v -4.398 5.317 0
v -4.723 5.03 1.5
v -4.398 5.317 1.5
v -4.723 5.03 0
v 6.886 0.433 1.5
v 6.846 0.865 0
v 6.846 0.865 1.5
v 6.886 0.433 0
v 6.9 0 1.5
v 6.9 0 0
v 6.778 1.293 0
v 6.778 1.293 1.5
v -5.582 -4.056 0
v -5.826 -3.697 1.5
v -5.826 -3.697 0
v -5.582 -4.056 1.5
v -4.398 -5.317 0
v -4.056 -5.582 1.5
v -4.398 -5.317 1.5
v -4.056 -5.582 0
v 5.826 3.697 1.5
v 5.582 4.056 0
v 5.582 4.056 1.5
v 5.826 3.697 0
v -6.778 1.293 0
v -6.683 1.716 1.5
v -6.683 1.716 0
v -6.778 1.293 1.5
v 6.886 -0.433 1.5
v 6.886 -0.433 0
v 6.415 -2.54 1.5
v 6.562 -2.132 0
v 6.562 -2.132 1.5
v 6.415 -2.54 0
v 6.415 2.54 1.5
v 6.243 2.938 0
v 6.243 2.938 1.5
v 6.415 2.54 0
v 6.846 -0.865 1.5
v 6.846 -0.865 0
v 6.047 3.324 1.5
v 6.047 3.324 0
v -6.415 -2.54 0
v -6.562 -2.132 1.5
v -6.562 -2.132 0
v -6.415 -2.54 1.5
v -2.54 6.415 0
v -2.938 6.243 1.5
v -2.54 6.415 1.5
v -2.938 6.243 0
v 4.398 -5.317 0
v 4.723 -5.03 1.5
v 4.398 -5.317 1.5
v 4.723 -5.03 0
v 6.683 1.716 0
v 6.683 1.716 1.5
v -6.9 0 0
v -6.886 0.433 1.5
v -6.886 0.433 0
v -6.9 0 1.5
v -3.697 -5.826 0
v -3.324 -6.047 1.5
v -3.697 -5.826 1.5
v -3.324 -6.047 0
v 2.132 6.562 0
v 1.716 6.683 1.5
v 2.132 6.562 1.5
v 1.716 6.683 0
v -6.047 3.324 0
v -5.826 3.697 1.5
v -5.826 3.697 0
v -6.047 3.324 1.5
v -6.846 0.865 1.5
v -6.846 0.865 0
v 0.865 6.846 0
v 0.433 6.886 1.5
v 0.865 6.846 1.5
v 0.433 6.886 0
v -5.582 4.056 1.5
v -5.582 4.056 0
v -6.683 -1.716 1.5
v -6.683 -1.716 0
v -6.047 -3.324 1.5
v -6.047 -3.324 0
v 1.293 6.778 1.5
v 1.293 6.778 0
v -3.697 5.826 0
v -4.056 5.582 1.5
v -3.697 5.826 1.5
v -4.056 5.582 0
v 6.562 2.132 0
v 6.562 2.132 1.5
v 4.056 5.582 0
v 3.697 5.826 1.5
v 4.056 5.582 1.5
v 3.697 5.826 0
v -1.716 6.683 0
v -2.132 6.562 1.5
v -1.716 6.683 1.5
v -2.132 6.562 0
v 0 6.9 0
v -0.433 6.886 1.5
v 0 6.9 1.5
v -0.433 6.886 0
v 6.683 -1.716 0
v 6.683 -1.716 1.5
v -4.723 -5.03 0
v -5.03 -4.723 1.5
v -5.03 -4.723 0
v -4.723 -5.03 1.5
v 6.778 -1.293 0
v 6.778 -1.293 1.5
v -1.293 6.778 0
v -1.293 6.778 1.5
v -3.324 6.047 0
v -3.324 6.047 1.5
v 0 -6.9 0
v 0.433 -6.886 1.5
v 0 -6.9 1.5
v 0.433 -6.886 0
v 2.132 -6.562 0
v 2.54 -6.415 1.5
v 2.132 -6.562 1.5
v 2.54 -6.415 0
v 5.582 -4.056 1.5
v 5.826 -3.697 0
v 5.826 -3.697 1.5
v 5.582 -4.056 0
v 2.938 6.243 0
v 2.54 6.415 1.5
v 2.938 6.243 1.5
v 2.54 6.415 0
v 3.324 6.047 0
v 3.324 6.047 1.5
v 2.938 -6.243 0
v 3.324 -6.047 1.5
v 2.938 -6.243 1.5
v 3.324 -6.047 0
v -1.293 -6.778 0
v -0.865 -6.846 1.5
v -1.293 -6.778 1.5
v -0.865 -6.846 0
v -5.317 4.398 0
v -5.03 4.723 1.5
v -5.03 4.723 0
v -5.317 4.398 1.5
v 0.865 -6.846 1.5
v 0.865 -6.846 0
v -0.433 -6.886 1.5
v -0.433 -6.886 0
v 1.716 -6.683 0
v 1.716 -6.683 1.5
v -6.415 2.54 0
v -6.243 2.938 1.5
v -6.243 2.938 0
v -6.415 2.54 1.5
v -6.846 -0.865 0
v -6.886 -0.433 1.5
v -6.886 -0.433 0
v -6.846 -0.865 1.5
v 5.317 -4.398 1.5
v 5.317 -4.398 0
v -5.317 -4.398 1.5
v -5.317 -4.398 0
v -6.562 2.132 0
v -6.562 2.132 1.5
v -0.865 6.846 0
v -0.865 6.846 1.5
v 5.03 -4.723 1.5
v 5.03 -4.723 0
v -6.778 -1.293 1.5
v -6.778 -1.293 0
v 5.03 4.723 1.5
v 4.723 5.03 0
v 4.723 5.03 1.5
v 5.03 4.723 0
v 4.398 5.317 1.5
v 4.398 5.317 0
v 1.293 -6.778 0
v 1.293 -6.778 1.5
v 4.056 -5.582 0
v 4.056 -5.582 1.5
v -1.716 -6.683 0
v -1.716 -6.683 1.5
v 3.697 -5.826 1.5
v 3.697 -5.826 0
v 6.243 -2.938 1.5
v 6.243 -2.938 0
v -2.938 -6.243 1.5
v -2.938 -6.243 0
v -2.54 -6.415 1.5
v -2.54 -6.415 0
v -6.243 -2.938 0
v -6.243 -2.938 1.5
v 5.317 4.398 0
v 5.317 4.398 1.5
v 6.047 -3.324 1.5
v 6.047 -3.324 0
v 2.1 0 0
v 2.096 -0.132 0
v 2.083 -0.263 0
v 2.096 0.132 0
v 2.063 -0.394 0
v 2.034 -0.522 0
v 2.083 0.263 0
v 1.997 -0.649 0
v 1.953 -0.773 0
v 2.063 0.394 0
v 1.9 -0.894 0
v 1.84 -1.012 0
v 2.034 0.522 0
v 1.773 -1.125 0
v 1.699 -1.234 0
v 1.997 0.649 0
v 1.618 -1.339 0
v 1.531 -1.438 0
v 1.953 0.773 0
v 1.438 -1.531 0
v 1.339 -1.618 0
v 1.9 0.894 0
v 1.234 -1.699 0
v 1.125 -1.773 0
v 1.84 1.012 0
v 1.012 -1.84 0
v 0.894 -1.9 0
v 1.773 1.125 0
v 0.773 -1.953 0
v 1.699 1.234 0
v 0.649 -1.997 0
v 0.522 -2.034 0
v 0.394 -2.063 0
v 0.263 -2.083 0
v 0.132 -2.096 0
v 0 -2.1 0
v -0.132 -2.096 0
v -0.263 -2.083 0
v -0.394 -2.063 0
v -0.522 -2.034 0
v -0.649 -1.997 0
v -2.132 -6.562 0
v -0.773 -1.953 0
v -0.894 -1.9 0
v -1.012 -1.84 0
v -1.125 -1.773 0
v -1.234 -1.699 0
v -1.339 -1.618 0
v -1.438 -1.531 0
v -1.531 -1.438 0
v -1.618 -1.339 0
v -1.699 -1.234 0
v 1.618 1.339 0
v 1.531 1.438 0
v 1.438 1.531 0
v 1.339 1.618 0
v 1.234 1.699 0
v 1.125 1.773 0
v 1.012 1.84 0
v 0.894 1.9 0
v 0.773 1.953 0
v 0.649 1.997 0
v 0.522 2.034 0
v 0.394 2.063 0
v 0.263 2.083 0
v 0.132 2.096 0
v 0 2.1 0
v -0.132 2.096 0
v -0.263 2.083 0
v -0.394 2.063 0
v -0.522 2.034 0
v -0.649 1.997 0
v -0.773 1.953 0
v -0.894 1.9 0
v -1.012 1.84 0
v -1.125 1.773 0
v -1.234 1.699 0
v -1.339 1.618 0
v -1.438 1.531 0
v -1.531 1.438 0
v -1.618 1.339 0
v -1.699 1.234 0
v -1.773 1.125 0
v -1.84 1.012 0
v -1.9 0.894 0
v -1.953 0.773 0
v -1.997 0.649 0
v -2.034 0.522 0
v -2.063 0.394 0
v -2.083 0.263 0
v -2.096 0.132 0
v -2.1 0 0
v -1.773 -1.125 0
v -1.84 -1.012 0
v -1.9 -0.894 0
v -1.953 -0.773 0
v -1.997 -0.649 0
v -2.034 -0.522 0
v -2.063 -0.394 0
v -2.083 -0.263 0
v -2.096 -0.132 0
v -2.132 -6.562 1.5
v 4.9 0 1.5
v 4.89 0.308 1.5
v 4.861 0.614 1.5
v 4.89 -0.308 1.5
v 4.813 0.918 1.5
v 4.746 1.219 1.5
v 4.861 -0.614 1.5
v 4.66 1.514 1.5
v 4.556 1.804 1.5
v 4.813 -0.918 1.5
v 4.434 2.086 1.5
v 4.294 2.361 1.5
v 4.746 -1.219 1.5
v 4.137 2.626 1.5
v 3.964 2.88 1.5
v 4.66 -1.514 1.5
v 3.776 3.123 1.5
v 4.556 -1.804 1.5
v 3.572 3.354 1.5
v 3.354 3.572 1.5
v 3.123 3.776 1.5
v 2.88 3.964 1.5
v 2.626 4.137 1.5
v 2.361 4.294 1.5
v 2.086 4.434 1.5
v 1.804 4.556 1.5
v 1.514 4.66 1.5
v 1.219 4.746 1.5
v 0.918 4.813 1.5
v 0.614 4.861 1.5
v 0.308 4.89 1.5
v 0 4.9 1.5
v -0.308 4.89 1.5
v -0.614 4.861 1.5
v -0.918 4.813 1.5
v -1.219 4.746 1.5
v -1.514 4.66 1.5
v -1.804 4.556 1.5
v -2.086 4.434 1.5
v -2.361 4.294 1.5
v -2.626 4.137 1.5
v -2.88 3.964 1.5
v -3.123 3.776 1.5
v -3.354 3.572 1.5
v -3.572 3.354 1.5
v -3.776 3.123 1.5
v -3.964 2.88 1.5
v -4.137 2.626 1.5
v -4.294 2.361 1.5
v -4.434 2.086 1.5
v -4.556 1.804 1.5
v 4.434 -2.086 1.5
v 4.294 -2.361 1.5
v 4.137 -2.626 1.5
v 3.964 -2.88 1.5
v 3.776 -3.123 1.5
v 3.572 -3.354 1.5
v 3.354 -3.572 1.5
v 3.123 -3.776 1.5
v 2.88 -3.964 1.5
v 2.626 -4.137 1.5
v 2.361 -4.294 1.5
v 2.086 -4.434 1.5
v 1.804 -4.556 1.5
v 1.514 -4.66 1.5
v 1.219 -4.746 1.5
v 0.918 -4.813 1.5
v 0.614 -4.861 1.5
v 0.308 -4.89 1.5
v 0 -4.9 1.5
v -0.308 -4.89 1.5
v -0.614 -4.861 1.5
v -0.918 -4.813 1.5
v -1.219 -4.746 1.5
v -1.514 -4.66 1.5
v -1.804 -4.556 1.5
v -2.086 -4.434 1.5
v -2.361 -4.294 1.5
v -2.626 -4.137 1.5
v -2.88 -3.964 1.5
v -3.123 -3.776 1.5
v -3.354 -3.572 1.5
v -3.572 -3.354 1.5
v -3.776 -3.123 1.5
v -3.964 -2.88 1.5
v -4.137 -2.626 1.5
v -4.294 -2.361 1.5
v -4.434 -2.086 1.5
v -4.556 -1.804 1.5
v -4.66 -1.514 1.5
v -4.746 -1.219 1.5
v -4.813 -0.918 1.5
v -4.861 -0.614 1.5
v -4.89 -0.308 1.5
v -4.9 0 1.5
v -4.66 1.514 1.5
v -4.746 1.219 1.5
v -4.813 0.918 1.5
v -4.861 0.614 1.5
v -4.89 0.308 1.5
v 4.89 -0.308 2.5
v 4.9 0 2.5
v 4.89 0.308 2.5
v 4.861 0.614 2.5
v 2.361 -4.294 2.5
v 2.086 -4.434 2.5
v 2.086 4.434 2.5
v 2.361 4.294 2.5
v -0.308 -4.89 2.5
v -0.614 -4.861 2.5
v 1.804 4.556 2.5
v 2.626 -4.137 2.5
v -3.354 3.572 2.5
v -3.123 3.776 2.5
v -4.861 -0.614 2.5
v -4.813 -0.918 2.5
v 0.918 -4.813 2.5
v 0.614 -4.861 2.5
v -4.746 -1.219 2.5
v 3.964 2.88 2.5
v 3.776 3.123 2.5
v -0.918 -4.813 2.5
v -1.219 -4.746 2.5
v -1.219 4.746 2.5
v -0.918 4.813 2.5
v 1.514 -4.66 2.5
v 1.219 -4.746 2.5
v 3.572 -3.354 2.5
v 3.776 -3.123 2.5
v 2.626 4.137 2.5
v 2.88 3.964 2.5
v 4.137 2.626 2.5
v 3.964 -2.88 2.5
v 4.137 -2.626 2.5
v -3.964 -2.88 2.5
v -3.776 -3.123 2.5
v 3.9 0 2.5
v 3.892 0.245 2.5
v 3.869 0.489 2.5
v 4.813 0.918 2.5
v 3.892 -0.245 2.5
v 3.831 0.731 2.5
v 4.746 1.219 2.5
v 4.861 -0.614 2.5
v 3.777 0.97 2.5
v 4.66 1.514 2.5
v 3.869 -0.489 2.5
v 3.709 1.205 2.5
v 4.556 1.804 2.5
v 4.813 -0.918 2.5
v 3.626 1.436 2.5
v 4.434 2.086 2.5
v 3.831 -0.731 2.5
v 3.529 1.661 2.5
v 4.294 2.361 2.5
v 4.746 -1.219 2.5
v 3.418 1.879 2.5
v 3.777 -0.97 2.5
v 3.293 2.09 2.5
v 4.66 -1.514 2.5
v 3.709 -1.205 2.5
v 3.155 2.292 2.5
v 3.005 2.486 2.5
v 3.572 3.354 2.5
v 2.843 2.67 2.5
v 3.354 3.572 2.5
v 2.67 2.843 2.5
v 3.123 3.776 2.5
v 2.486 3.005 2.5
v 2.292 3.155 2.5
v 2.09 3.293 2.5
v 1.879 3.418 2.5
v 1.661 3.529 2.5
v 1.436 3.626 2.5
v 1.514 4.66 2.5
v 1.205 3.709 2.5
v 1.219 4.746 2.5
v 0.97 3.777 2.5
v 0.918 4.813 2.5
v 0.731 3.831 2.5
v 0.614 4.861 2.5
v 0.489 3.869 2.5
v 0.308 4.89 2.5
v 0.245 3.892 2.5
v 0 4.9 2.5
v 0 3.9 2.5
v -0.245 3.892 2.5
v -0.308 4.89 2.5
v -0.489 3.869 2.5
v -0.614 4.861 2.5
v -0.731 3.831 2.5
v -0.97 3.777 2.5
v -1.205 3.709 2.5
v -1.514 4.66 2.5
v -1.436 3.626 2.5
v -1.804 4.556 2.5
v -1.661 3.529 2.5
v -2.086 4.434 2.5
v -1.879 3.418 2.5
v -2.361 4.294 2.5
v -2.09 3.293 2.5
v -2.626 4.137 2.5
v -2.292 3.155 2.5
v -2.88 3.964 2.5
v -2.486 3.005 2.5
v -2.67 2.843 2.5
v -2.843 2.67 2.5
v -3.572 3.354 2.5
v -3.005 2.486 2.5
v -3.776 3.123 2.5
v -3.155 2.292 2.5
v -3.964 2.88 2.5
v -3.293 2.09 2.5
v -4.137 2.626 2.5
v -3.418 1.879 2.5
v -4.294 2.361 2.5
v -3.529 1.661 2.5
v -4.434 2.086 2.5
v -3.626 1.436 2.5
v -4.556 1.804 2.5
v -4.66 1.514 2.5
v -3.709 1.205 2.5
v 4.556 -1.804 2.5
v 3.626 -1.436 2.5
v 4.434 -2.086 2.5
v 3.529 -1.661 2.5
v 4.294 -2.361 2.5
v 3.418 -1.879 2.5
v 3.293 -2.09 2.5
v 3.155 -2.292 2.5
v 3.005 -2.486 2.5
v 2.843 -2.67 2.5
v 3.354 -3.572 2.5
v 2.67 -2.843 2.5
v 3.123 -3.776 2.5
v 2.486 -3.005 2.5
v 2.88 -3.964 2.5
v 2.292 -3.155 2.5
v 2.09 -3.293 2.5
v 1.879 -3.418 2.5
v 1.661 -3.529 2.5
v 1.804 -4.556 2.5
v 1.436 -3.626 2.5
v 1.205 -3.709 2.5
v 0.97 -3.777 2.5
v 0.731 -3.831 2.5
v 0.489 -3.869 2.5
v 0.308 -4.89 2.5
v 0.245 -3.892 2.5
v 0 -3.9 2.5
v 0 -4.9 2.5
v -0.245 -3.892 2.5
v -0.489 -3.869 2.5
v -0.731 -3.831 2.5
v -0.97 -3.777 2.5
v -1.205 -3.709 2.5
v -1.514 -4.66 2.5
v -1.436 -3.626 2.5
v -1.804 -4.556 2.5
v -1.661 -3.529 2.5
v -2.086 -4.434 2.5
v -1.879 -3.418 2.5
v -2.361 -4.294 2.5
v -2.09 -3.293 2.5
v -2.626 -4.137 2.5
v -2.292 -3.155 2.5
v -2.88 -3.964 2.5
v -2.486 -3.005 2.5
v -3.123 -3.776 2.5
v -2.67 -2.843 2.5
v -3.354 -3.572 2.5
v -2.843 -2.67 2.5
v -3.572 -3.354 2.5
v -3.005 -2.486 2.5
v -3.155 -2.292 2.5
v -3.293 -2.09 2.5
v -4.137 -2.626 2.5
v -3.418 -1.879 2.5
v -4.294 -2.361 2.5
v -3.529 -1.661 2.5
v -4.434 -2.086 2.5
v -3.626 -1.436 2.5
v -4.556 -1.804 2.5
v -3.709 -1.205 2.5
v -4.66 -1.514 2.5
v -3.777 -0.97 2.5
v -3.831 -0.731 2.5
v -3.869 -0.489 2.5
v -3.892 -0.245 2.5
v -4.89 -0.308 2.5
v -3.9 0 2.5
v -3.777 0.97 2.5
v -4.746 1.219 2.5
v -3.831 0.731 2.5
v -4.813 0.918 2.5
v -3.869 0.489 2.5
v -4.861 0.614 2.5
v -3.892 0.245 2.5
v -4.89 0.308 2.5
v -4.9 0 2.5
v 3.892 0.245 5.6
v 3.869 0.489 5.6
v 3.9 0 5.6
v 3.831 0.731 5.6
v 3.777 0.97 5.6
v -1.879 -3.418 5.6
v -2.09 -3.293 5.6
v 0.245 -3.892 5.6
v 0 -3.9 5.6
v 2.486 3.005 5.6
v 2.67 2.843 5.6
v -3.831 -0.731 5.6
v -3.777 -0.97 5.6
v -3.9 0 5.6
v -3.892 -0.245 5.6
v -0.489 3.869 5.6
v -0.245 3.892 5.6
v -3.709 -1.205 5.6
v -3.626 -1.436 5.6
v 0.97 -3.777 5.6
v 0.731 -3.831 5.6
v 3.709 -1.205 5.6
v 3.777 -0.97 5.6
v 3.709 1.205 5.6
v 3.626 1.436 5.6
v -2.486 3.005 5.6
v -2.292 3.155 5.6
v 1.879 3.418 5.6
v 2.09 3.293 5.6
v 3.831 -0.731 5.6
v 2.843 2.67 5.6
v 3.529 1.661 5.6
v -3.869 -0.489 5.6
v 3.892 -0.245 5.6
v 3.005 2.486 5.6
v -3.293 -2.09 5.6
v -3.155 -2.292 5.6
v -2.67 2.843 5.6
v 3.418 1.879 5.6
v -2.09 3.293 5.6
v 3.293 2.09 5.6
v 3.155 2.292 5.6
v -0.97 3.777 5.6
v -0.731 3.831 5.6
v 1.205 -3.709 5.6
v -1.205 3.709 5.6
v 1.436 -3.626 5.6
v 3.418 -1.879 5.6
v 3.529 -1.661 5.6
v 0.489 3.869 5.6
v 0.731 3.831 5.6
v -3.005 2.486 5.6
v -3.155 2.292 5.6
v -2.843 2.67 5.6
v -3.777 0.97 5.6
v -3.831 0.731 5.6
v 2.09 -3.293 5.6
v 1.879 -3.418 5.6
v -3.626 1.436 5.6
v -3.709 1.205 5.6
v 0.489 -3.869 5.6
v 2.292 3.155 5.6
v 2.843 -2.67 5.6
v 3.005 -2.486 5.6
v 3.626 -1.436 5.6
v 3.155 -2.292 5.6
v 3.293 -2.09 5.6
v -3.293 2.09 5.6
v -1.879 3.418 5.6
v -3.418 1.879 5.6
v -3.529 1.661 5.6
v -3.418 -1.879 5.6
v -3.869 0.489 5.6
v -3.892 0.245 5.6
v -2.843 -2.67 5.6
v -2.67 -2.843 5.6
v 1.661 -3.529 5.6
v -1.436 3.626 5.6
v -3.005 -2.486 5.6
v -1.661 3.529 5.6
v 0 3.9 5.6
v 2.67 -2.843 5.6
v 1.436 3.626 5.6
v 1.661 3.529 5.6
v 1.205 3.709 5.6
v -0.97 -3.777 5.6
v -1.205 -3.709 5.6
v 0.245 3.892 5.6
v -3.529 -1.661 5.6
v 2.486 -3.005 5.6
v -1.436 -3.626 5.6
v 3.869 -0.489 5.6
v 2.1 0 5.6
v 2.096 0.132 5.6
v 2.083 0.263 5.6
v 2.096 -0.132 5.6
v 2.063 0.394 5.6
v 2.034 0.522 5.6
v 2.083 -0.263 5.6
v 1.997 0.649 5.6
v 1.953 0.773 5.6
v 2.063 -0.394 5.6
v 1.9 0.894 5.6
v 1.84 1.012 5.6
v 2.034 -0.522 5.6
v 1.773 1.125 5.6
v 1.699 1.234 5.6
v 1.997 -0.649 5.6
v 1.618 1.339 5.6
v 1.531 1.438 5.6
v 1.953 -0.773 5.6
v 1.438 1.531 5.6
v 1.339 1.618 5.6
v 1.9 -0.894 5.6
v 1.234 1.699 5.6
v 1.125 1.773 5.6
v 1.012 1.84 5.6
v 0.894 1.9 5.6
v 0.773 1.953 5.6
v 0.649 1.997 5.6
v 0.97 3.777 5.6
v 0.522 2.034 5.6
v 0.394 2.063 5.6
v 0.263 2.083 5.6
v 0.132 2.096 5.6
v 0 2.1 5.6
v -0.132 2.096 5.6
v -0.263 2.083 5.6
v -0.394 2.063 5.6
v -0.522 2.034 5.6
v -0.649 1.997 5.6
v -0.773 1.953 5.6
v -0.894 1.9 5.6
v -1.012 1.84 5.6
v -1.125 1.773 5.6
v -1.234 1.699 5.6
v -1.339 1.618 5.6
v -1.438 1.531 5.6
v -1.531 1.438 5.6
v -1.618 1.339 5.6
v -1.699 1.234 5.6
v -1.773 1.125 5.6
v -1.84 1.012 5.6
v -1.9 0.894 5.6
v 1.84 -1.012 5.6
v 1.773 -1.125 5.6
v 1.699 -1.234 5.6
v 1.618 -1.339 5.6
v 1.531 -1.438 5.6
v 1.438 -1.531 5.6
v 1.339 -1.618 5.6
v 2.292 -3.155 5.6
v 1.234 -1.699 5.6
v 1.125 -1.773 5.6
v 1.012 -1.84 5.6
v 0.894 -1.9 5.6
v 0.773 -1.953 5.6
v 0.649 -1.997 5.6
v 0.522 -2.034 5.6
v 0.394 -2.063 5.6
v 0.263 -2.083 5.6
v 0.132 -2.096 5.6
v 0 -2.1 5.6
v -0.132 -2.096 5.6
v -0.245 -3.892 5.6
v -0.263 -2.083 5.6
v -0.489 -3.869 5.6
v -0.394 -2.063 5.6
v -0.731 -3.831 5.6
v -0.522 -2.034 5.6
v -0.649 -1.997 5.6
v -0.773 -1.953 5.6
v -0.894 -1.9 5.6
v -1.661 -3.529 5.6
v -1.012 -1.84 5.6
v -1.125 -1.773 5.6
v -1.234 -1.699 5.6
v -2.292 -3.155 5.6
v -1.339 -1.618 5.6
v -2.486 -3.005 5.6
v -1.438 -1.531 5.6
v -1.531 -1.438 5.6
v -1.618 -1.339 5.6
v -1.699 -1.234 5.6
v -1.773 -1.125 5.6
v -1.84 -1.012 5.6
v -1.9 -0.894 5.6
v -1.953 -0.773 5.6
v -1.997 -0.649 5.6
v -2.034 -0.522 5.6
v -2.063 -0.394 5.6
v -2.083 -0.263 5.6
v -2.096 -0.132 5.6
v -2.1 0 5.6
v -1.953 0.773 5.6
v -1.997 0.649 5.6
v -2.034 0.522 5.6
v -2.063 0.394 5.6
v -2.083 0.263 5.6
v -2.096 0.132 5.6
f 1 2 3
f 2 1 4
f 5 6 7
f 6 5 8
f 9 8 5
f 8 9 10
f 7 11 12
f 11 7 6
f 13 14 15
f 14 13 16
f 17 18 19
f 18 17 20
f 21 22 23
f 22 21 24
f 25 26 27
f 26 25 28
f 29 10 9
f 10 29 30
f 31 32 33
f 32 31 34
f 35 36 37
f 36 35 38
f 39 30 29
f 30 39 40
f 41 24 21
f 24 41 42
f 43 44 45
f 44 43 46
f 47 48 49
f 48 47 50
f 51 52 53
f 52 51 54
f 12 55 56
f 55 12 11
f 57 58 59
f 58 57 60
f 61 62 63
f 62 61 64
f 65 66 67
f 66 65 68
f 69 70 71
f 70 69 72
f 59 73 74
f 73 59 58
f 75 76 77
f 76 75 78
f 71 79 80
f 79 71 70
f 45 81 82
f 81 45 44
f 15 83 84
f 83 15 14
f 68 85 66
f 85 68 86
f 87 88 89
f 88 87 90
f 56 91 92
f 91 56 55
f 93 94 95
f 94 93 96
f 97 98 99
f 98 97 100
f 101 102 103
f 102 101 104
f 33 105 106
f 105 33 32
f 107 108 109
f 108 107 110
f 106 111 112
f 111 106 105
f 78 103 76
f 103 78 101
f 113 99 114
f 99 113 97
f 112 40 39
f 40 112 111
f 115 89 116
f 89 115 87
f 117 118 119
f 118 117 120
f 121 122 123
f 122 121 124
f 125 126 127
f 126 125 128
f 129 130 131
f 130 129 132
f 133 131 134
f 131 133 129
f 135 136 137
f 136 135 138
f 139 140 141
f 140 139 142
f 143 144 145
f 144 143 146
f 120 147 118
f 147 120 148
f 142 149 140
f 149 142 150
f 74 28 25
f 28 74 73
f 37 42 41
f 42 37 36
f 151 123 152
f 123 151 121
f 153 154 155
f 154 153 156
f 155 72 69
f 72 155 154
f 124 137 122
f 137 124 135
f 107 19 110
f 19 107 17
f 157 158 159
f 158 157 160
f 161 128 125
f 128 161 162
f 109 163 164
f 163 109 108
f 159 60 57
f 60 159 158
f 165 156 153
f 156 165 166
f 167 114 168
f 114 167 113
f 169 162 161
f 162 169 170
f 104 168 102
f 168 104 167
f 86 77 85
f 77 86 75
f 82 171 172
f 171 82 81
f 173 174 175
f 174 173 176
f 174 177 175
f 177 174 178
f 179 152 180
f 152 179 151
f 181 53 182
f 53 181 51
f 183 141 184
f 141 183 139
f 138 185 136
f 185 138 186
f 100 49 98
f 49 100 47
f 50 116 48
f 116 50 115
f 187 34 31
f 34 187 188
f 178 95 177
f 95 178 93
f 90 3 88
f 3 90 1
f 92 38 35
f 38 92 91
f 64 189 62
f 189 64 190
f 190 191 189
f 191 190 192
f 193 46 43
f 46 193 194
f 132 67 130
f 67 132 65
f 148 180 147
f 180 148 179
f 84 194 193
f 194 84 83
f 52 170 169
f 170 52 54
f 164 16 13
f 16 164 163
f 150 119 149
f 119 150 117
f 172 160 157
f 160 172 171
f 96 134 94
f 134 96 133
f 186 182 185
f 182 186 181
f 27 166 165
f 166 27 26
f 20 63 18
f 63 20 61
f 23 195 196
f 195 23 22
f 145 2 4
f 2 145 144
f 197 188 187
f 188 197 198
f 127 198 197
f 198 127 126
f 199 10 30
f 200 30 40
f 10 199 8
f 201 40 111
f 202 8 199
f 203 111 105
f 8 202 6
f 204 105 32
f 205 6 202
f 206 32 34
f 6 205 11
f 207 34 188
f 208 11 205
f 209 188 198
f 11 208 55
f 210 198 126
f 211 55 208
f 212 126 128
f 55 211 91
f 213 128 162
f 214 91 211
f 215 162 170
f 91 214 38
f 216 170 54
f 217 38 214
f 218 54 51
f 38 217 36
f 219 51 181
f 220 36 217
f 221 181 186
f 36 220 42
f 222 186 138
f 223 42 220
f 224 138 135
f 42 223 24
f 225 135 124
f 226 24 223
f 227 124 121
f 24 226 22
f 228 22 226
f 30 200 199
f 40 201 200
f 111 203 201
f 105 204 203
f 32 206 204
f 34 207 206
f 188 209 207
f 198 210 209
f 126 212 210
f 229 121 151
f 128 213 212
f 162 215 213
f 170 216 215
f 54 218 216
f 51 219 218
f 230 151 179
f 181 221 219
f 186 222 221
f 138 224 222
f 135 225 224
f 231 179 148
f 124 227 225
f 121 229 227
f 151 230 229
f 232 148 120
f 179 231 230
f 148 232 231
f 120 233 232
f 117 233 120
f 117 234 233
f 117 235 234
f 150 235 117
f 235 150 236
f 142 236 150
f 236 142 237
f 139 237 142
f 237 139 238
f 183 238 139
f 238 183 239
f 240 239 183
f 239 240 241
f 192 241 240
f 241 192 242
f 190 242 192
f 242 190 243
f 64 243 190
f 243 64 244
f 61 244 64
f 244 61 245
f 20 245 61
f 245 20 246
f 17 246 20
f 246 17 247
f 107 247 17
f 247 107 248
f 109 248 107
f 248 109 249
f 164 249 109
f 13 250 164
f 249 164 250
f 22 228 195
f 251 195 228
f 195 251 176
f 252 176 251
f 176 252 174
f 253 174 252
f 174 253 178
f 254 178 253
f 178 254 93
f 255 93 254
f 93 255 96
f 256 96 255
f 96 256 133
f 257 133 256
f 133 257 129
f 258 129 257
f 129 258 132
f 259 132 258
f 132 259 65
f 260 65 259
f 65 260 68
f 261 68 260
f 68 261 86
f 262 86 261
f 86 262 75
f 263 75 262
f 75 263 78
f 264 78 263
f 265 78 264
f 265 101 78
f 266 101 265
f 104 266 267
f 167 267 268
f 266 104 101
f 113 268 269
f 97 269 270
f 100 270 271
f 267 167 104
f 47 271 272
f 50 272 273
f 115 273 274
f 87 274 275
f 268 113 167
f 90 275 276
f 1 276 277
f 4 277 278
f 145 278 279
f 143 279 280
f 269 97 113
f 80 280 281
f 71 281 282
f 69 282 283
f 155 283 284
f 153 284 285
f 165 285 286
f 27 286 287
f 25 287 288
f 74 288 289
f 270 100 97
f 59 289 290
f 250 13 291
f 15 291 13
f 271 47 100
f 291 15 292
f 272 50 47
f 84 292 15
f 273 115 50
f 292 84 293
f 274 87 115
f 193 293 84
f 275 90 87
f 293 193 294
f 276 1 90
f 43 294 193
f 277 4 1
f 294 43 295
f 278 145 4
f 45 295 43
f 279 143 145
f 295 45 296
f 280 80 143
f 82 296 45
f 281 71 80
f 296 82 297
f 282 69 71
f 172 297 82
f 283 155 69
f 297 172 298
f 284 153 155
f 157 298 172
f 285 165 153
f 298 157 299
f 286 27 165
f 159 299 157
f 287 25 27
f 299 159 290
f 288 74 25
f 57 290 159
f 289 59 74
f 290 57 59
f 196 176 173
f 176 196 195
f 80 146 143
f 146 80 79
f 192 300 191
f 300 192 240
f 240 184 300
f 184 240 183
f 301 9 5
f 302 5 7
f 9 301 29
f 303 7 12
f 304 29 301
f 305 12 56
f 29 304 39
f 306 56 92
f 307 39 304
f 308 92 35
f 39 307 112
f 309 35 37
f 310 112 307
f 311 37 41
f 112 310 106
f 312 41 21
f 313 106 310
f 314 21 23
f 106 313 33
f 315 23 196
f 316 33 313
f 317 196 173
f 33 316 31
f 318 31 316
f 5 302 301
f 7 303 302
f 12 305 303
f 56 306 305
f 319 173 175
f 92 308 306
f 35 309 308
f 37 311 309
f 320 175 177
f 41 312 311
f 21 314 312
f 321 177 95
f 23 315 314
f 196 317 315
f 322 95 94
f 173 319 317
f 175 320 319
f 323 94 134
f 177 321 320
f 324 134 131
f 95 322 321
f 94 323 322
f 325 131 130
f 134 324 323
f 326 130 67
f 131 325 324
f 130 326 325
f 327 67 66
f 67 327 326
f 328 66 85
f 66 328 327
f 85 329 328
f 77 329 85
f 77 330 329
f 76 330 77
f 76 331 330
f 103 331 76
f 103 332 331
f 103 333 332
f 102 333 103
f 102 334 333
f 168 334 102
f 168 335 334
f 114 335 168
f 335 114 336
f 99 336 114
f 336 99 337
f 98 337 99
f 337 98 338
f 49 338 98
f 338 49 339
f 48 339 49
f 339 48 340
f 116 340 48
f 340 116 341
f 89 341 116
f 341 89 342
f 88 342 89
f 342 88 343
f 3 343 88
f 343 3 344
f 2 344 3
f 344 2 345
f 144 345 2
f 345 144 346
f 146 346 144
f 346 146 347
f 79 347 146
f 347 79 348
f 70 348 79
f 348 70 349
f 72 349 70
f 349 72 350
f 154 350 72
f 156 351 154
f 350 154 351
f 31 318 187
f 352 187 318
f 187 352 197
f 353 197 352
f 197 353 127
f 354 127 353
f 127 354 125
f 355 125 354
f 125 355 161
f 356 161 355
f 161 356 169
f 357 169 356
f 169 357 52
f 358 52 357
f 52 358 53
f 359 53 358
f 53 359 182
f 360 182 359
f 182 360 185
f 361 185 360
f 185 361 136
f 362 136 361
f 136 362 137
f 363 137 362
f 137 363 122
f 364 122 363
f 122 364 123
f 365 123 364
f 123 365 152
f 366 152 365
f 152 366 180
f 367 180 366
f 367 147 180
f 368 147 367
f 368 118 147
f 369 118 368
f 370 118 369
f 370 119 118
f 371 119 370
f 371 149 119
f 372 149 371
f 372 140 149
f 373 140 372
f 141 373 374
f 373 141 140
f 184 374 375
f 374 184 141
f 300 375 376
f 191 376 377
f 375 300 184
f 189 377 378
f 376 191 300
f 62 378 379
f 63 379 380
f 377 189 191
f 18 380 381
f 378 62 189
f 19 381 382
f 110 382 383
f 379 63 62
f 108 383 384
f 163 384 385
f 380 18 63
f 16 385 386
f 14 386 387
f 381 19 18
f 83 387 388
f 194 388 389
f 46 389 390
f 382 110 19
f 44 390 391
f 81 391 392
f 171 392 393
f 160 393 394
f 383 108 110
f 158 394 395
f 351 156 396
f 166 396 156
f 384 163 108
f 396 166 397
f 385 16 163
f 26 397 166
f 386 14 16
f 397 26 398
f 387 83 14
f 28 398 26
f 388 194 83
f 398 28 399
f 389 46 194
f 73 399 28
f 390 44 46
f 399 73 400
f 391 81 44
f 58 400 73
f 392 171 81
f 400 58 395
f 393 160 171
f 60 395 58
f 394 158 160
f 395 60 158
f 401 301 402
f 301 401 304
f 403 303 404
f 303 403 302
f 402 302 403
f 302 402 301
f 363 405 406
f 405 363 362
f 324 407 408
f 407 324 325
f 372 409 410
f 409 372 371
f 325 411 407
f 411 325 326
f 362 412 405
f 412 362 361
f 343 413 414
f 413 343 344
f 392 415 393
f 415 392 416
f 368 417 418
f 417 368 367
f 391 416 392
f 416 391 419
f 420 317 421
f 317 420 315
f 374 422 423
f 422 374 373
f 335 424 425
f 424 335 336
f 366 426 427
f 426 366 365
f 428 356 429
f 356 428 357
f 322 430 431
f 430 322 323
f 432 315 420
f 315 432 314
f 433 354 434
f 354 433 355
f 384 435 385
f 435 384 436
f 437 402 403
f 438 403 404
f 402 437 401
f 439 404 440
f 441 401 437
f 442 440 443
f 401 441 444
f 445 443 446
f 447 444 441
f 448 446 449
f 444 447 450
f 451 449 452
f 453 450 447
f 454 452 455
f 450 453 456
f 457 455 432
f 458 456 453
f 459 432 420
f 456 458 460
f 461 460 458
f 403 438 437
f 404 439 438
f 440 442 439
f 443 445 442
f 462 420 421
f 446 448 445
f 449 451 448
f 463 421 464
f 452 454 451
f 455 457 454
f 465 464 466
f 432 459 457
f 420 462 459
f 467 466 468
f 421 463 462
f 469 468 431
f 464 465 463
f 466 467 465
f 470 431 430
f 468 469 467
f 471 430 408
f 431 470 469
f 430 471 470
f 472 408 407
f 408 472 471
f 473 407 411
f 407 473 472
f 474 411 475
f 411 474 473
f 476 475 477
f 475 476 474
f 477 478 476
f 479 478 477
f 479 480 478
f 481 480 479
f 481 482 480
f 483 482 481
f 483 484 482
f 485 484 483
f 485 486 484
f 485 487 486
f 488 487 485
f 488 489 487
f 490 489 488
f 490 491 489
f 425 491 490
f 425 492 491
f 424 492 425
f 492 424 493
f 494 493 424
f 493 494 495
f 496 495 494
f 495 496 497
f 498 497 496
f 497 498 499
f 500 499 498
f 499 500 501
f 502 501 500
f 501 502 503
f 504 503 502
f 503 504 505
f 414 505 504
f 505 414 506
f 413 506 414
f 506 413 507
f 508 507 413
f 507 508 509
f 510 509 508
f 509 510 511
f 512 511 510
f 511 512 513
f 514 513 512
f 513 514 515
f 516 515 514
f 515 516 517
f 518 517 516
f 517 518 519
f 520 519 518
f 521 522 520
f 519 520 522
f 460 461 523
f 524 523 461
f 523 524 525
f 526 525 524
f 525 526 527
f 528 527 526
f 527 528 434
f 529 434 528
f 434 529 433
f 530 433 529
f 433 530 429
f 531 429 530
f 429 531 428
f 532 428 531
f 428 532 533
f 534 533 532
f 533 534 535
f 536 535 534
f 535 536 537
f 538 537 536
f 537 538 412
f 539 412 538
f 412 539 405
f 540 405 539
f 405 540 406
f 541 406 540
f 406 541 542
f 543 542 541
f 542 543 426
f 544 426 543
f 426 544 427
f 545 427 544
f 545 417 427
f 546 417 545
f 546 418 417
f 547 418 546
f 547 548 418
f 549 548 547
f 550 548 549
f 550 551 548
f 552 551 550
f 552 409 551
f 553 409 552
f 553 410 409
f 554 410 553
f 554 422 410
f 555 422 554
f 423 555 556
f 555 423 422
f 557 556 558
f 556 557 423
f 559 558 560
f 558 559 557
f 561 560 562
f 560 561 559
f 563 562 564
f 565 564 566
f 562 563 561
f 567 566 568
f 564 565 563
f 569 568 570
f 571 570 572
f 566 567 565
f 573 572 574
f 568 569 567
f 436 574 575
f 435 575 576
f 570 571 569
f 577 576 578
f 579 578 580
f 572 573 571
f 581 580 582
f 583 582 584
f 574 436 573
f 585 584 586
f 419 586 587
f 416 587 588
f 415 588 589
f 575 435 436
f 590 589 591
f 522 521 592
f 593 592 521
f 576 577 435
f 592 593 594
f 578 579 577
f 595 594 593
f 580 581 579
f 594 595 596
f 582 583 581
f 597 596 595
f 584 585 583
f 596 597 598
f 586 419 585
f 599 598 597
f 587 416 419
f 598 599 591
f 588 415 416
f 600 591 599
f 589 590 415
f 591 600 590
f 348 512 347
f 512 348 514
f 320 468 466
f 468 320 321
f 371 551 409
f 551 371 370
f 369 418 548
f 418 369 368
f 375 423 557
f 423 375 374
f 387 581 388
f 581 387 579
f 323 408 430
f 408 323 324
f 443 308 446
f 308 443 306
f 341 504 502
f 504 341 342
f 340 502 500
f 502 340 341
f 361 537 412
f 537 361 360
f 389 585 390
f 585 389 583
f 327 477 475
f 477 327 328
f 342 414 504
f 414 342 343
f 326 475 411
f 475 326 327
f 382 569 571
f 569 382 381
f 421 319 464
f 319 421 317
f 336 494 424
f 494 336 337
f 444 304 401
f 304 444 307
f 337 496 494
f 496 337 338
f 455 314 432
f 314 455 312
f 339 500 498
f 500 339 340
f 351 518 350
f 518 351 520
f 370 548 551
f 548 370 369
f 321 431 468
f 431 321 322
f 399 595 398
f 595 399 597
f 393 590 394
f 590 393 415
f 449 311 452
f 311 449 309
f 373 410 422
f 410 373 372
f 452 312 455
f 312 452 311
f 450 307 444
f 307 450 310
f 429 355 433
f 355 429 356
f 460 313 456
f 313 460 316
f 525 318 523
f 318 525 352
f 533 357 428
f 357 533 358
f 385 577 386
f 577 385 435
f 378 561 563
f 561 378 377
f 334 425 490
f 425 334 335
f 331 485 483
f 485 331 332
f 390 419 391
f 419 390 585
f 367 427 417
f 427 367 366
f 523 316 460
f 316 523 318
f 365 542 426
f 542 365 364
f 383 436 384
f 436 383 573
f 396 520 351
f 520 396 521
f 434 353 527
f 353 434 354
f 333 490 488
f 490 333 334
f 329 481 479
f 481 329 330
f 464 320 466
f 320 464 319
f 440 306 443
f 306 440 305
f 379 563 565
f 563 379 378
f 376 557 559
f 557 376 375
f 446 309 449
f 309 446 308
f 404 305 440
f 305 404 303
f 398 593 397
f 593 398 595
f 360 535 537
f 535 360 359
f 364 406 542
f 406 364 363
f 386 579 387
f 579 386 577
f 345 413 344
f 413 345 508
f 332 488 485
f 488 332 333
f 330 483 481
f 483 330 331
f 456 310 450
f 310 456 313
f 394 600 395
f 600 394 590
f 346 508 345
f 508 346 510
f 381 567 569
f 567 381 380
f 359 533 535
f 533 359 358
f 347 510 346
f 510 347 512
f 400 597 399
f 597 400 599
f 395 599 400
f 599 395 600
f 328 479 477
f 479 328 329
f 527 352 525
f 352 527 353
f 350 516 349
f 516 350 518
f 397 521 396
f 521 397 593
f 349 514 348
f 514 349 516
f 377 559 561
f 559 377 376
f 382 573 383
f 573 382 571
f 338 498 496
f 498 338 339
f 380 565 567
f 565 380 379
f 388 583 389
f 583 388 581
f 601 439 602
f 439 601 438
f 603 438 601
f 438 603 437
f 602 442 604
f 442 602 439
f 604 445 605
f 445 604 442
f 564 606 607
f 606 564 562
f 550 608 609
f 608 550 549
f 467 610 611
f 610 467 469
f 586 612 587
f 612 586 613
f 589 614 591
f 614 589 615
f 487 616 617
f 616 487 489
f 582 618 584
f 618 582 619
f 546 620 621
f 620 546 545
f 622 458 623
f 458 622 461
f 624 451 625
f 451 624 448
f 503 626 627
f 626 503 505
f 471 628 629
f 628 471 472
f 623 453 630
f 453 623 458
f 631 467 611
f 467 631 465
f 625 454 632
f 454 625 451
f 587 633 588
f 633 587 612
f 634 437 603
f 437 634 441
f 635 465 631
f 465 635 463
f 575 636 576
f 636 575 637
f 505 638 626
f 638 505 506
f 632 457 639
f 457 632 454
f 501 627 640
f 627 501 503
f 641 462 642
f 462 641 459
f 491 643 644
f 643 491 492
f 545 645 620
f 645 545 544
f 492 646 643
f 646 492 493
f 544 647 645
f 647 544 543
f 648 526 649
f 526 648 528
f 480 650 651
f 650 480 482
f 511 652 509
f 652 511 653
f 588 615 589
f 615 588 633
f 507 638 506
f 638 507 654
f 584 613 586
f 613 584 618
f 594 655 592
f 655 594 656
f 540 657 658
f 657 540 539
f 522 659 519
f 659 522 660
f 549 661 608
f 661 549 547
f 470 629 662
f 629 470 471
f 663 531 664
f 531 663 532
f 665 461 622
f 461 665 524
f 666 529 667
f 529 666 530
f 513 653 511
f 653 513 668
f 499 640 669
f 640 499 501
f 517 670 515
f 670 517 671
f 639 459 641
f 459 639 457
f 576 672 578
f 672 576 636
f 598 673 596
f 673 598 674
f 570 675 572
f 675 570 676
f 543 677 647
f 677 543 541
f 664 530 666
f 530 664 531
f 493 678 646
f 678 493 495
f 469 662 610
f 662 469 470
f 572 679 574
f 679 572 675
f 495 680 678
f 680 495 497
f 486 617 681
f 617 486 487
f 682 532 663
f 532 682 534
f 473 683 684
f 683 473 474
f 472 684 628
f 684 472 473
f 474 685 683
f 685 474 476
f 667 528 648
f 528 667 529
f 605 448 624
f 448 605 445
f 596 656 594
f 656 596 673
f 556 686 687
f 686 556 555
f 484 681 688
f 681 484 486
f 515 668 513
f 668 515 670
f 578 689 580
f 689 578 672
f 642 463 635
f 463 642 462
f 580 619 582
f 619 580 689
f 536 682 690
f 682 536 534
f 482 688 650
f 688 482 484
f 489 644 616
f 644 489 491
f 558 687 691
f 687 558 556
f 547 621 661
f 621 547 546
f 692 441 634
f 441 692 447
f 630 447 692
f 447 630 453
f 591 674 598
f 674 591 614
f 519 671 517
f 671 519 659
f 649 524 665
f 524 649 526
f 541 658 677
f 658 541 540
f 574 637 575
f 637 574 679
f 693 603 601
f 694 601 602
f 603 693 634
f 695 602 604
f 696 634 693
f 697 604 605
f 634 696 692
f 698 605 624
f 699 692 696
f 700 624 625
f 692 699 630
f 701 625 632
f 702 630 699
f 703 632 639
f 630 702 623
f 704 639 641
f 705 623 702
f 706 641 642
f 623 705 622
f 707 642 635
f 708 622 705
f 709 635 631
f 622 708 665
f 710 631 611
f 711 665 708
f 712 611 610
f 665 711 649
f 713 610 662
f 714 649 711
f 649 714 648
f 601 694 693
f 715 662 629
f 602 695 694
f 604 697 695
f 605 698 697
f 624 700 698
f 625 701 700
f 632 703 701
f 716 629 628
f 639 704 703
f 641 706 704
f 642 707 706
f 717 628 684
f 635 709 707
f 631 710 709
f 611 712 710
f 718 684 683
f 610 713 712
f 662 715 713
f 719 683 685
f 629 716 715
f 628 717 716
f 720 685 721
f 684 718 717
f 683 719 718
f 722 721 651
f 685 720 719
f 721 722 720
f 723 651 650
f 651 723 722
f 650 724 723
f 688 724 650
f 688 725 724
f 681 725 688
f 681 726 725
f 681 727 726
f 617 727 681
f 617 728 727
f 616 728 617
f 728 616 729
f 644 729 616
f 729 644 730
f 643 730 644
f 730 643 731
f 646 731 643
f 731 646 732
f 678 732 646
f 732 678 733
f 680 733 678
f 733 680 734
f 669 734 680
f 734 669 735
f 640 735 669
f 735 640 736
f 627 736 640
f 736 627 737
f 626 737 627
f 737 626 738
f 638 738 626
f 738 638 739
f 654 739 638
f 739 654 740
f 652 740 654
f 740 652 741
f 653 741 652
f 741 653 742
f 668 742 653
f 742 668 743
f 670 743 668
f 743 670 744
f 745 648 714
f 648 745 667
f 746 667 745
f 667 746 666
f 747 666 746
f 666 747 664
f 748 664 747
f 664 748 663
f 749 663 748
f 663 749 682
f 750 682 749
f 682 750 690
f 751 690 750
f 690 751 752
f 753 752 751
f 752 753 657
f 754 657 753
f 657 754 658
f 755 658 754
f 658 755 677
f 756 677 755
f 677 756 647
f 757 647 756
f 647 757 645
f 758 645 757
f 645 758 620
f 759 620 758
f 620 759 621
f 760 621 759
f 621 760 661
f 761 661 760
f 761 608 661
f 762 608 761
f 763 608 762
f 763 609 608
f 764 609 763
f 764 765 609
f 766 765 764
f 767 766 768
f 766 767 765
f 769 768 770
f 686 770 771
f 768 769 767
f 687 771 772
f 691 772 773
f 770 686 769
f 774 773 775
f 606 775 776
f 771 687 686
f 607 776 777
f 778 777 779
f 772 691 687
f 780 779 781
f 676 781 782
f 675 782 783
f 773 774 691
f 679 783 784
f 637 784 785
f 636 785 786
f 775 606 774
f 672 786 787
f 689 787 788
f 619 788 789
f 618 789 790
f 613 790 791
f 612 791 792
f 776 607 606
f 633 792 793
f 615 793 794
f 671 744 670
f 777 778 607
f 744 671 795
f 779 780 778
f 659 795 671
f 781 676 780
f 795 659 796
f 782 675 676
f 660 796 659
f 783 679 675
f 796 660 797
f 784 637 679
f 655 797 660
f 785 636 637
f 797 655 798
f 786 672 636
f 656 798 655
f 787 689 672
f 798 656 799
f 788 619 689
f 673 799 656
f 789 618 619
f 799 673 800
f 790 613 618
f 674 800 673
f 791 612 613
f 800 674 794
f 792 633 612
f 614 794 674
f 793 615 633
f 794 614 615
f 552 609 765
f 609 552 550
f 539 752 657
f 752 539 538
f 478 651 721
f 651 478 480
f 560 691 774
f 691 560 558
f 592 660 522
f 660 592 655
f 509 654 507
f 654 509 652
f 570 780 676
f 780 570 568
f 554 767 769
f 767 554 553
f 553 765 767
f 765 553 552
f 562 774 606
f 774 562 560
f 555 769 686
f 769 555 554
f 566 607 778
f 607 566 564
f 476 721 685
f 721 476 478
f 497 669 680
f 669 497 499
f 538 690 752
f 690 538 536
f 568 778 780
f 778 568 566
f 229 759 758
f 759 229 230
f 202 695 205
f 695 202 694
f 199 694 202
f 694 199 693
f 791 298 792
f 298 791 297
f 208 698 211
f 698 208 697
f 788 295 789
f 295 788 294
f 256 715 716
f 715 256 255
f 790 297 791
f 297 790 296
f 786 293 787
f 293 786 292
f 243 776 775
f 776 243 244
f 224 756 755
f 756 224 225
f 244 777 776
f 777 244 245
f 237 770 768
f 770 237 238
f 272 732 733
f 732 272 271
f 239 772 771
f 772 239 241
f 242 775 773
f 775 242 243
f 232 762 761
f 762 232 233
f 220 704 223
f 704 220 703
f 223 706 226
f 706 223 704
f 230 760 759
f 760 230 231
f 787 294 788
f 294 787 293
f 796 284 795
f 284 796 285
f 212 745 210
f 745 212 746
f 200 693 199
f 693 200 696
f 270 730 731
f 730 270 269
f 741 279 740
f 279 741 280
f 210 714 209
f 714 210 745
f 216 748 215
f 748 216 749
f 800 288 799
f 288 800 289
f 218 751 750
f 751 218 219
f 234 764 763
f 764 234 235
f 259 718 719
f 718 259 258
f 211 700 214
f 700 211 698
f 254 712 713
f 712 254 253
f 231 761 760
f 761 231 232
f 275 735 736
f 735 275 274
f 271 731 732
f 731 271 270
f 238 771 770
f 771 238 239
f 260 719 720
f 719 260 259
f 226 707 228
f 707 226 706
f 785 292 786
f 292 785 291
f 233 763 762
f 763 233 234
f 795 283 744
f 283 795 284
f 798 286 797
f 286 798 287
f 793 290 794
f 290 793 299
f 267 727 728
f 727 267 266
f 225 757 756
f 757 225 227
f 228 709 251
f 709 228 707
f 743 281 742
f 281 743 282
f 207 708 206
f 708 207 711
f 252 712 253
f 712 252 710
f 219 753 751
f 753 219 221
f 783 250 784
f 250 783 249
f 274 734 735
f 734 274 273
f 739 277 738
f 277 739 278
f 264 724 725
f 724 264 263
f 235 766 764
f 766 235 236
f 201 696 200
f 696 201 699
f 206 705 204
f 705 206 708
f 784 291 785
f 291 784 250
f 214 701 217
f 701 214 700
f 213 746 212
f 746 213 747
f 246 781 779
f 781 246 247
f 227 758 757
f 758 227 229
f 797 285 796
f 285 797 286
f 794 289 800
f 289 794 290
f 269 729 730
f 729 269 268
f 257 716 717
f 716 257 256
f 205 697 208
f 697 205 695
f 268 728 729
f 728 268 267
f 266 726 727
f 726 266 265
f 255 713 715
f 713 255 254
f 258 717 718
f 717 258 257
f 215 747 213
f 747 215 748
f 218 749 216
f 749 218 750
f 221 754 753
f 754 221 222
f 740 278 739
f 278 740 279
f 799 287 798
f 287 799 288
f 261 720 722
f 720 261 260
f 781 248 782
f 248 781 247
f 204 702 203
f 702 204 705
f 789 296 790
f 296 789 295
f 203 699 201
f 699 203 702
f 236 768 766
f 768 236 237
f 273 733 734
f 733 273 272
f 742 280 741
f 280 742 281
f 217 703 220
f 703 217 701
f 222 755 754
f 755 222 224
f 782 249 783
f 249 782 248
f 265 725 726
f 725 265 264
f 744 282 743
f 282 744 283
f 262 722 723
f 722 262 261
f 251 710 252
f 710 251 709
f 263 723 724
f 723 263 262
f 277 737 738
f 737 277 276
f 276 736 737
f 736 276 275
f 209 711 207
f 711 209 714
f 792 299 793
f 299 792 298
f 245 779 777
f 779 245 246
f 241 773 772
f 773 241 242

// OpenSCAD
/* [Spacer] */

bearing_thickness=7;

bearing_hole_diameter=8;

spacer_outer_diameter=14;

// total space to fill with 2 spacers and bearing
width_to_fill=12;

/* [Shim] */

shim_width=1;

shim_thickness=1;

/* [Optional screw hole] */

screw=1; // [1:yes,-1:no]

screw_hole_diameter=4;

/* [Fine tuning] */

// XY compensation
tolerance=0.1;

definition=100; // [50:low,100:medium,150:high]

/////////////////////
// calculated fields
shim_diameter = bearing_hole_diameter+(shim_width*2);
total_thickness = (width_to_fill/2) - 0.4;
spacer_thickness = ((width_to_fill-bearing_thickness)/2)-shim_thickness;

/////////////////////
$fn=definition;

module spacer() {
    difference() {
        union() {
            cylinder(d=spacer_outer_diameter-(2*tolerance), h=spacer_thickness);
            cylinder(d=shim_diameter-(2*tolerance), h=spacer_thickness+shim_thickness);
            cylinder(d=bearing_hole_diameter-(2*tolerance), h=total_thickness);
        }

        if(screw==1){
            translate([0,0,-1]) cylinder(d=screw_hole_diameter + 2*tolerance, h=total_thickness + bearing_thickness +2);
        }
    }
}

spacer();
